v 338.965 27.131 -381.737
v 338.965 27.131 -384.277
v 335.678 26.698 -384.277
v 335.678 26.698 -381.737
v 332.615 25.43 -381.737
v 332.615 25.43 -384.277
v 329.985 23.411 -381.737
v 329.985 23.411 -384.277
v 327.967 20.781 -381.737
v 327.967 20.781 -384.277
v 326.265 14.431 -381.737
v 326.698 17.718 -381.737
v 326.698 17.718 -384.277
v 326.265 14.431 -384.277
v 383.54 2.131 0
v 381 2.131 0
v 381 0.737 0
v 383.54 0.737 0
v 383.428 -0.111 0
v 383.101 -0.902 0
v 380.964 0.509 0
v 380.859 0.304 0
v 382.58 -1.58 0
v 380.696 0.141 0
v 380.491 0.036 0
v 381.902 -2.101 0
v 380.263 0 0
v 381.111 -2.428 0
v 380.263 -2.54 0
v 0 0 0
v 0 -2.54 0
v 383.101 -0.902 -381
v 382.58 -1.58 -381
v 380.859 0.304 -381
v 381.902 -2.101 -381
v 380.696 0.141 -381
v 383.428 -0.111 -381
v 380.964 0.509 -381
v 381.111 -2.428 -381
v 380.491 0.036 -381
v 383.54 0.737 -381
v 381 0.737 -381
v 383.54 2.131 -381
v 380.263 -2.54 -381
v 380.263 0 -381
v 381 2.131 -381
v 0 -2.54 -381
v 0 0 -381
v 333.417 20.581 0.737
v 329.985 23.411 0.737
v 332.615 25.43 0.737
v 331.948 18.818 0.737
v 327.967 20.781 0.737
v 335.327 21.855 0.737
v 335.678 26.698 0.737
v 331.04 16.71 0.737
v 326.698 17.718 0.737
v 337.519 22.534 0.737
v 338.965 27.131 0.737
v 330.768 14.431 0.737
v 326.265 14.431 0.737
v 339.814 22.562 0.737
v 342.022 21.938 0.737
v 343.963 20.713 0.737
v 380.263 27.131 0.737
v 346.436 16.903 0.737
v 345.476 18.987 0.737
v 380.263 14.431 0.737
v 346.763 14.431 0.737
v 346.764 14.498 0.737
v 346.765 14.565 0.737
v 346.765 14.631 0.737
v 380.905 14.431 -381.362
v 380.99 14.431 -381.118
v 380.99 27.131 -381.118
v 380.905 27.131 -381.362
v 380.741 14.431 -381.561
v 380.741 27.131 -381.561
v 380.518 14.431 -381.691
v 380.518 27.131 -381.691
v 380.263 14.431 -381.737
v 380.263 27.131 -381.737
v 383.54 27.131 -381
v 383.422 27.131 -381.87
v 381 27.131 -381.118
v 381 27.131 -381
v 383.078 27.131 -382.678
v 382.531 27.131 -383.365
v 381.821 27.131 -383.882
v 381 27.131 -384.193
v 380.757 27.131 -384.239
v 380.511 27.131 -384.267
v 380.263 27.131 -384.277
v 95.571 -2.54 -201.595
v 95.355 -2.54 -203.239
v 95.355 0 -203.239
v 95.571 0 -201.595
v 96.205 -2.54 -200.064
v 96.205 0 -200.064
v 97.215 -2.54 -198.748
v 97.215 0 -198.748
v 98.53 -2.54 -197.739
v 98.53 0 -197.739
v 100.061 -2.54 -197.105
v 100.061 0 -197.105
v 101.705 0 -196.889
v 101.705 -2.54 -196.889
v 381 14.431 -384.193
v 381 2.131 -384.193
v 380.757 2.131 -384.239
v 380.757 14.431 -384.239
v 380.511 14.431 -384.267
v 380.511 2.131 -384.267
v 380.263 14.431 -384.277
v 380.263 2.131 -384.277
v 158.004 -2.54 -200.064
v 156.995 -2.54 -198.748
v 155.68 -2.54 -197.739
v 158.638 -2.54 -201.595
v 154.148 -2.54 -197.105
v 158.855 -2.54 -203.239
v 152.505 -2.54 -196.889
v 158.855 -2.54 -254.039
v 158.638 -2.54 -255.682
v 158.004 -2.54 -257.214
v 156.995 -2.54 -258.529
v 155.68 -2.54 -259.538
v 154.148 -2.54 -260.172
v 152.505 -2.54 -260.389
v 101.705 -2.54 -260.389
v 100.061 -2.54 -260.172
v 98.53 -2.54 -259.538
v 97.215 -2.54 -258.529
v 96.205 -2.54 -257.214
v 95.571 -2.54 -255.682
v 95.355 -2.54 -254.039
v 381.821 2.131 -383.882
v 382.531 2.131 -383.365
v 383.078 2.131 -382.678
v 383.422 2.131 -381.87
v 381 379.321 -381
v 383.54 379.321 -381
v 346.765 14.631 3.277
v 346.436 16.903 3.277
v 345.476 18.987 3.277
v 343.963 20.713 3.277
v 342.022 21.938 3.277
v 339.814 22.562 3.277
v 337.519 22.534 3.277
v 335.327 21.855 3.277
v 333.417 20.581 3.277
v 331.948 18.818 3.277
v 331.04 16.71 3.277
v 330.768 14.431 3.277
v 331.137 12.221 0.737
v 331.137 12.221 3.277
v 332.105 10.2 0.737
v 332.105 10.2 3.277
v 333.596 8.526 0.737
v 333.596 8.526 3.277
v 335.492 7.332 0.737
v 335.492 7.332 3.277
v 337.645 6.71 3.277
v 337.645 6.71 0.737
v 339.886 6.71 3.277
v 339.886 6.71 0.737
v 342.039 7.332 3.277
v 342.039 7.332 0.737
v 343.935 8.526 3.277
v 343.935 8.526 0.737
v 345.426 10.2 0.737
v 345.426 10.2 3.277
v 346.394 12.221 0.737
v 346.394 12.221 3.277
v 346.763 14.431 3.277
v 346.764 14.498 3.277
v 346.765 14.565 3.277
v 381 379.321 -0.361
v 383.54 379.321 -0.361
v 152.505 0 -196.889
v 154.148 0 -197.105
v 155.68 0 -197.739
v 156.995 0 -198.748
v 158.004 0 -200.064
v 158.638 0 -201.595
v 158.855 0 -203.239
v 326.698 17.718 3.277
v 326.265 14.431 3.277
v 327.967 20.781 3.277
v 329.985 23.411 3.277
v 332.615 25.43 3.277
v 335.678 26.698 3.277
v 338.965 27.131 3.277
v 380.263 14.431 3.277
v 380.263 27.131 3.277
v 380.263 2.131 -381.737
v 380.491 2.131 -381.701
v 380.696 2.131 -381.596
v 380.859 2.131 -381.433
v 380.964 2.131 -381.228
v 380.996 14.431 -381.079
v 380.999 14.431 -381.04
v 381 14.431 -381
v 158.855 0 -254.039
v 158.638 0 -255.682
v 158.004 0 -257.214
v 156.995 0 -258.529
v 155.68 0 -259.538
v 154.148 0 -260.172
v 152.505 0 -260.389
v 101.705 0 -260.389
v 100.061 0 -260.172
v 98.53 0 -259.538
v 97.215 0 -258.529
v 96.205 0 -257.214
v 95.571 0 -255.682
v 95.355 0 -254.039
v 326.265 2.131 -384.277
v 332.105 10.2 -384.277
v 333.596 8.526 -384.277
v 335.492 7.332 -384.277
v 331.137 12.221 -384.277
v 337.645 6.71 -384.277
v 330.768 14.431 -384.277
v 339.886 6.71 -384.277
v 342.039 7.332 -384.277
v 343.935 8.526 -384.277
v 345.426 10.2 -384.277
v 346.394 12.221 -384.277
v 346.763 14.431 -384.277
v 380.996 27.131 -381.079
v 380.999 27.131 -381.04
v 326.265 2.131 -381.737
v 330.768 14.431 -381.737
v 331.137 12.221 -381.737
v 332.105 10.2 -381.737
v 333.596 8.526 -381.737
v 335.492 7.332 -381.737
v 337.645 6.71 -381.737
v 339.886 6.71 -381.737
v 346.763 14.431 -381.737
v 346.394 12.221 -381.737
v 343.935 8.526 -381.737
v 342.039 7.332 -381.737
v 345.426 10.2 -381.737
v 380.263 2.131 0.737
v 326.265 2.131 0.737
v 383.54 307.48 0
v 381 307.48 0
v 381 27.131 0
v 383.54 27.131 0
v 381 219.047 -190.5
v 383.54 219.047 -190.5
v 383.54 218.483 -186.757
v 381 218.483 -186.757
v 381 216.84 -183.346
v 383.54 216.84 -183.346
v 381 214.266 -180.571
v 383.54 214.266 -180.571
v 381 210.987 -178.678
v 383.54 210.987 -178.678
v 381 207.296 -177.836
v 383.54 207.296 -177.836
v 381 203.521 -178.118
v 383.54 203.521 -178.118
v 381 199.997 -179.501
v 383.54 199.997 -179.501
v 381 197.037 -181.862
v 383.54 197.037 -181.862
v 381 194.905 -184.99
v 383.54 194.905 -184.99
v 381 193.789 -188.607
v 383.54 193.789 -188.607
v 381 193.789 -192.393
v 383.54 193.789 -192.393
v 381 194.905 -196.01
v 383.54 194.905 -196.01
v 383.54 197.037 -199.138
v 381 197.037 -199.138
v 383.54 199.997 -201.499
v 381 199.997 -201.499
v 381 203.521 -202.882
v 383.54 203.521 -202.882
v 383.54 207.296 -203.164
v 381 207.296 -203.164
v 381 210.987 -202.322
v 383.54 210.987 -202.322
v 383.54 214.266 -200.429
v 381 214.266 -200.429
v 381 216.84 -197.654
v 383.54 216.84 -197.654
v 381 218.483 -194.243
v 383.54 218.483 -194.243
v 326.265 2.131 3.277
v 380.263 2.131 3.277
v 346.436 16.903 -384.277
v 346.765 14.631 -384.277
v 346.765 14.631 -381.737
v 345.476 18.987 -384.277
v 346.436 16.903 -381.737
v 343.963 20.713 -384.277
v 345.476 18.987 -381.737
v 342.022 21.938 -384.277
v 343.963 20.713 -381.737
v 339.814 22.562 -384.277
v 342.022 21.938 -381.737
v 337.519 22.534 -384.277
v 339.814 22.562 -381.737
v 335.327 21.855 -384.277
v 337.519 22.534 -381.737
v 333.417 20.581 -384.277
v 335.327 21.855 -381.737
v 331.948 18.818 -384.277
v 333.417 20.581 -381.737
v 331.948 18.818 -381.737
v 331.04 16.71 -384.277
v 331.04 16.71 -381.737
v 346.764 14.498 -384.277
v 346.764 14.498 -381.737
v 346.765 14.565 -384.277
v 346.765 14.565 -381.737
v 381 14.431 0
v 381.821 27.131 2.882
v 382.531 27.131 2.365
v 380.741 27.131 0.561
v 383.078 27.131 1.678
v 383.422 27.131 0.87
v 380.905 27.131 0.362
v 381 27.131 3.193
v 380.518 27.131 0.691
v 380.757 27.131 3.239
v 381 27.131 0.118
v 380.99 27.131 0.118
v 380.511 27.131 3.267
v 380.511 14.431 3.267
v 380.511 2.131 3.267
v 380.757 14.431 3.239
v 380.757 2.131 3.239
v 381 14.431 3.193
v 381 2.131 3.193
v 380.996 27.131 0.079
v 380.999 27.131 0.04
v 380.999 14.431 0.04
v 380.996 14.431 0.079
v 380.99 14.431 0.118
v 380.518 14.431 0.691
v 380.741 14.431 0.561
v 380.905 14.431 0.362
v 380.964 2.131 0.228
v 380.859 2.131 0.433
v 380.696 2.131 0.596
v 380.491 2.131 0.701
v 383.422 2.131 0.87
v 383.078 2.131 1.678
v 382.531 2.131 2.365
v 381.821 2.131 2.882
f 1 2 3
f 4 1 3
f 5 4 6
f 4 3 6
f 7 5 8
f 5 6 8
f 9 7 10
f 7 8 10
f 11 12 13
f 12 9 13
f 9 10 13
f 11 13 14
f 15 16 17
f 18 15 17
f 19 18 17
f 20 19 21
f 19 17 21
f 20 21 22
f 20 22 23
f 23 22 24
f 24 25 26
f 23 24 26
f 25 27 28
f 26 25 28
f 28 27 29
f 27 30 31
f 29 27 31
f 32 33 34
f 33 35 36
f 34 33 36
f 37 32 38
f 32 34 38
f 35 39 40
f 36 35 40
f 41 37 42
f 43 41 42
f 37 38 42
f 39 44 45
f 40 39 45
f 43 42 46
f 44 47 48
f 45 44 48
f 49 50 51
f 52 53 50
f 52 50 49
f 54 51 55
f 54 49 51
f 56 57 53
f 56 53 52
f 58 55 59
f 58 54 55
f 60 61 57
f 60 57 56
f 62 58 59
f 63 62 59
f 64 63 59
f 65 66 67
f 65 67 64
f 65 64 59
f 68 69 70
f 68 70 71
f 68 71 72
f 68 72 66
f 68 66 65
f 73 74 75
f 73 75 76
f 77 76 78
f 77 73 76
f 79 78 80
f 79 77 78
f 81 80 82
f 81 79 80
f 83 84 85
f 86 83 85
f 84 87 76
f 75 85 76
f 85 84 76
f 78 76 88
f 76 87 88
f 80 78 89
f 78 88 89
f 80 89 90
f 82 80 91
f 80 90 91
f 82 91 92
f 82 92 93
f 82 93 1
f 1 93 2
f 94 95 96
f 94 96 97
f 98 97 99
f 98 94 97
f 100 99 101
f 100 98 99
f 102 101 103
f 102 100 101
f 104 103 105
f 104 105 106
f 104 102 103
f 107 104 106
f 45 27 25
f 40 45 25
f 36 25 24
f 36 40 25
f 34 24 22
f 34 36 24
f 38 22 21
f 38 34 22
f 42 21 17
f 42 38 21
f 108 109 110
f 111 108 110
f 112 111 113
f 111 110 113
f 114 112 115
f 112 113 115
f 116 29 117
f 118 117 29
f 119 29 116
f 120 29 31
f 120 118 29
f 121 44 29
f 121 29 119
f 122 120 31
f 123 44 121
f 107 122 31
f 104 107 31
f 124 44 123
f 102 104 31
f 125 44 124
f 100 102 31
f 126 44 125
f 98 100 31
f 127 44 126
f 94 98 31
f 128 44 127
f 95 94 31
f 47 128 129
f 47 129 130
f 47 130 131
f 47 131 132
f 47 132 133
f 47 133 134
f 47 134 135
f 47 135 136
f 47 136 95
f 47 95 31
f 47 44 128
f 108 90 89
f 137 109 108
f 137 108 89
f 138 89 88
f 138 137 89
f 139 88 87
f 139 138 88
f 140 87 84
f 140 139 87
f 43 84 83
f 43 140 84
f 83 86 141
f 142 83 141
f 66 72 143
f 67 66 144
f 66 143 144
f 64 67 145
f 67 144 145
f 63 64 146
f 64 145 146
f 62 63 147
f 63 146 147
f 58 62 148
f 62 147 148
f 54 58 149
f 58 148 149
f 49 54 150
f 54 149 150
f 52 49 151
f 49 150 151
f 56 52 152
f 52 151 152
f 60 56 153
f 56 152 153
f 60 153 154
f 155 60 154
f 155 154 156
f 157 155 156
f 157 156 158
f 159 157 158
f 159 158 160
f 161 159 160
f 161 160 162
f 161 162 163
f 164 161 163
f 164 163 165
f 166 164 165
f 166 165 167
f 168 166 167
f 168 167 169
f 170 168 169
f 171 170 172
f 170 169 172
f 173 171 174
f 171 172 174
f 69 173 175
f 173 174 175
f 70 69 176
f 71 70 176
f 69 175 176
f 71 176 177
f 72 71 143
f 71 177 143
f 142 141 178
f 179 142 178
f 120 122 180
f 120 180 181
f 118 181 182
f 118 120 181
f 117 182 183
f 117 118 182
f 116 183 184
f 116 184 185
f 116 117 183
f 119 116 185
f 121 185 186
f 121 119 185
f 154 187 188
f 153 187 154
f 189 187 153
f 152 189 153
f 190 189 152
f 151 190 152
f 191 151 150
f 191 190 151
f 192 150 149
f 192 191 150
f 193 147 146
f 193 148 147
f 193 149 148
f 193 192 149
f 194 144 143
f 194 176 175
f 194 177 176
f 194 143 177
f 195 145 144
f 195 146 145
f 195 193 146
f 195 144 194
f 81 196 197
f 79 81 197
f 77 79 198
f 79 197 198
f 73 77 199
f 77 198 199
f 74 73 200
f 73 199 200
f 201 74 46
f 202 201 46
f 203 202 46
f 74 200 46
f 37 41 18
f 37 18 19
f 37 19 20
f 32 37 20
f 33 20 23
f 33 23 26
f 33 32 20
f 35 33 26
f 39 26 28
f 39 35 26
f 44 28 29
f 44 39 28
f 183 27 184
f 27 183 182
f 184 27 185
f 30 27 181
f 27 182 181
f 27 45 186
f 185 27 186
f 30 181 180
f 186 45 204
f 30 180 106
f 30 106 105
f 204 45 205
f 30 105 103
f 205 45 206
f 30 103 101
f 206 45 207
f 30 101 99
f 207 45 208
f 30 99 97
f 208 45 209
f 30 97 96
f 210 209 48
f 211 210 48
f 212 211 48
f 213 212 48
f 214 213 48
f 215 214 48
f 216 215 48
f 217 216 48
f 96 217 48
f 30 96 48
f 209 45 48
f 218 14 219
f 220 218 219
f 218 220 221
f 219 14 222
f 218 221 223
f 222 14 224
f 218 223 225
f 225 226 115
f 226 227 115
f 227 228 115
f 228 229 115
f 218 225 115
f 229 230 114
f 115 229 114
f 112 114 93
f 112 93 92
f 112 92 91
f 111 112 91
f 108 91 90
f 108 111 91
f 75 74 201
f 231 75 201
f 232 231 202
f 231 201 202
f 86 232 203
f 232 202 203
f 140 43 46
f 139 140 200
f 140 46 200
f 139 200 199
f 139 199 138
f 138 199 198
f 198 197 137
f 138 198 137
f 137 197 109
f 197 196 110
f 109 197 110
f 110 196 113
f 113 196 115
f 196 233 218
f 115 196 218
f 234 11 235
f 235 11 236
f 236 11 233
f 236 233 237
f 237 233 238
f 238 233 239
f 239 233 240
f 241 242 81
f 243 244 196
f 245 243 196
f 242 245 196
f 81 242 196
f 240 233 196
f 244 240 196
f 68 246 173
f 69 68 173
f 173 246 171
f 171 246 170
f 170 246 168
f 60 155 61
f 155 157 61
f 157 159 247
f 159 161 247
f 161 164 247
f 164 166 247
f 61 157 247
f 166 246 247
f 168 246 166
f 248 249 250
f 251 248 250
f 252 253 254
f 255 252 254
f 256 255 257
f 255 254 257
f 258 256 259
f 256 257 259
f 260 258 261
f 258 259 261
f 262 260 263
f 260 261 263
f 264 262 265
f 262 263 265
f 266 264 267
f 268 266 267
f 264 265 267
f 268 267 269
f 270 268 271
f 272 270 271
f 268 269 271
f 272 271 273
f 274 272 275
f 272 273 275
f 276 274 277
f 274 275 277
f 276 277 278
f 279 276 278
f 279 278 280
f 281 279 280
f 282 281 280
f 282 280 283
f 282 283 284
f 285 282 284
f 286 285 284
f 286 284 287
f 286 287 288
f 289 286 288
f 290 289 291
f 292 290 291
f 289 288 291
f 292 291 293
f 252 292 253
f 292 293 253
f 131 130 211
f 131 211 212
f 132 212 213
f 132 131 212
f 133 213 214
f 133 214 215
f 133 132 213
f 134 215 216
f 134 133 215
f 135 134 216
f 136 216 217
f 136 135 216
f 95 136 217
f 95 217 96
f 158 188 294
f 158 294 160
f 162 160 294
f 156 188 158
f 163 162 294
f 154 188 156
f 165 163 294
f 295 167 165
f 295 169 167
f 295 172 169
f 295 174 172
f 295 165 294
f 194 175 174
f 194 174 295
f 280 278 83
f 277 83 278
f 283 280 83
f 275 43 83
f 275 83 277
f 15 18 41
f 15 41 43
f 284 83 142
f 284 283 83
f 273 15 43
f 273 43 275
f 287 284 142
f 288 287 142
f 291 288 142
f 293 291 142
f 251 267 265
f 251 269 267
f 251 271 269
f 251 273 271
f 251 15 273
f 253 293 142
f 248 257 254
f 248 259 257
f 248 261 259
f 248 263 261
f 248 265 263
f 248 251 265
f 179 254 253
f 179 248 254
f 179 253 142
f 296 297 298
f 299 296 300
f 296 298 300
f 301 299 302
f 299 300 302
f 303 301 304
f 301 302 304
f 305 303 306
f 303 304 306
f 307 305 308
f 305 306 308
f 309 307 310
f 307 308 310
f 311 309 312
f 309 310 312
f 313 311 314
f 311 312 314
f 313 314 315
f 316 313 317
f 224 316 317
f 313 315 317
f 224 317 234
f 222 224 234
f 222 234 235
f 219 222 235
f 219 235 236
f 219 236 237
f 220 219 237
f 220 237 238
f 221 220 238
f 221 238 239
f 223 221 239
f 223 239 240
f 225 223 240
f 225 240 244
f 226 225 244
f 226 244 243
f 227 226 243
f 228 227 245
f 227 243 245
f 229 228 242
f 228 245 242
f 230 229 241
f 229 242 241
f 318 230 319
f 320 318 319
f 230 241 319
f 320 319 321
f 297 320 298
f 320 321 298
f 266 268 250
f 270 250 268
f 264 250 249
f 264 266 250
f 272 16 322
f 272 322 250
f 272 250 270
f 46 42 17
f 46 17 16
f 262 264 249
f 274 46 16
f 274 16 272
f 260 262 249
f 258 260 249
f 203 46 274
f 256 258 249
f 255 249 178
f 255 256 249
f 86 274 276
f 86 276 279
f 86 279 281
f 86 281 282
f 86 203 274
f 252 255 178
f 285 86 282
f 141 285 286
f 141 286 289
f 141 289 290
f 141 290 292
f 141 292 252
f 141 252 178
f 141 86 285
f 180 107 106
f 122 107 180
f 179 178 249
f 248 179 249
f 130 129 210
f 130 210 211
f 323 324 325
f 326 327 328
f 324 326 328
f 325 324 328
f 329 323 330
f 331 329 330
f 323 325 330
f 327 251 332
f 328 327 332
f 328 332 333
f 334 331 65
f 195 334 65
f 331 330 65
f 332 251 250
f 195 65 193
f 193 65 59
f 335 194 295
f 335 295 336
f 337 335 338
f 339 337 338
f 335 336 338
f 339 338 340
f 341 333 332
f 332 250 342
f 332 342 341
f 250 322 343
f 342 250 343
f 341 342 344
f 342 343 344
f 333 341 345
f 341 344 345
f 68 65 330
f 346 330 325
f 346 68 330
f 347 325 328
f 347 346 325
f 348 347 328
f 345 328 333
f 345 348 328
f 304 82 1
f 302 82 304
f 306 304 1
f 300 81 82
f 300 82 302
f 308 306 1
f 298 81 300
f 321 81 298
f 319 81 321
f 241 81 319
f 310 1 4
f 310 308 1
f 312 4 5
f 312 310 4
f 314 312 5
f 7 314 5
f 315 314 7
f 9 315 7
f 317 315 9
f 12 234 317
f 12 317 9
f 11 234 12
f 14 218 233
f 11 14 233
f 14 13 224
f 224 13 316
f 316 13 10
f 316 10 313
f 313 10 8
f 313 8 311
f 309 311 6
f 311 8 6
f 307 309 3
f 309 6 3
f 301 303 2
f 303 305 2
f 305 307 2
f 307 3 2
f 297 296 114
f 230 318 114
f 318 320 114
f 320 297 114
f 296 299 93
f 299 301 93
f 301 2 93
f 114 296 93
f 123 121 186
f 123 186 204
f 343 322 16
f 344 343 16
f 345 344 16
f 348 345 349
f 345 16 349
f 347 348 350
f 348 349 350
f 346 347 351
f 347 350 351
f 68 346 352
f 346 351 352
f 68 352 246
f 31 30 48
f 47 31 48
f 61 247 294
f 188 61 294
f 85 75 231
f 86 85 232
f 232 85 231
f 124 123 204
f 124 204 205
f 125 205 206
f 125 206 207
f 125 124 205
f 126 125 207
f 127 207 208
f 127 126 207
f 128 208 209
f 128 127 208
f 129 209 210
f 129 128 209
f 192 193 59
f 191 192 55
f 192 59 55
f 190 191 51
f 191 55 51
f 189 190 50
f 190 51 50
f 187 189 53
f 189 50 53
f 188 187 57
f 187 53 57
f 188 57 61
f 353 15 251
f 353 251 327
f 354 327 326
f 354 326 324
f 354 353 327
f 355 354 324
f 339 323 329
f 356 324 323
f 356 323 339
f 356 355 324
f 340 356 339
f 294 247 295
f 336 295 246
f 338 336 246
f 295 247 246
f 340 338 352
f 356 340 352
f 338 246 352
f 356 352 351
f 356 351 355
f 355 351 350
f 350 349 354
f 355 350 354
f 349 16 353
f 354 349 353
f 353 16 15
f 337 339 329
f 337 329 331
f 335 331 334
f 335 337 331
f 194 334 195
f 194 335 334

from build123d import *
from build123d.topology import SkipClean

# Parameters (mm, degrees)
BASE_FLANGE1_DEPTH       = 2.54
SKETCHED_START           = 383.54
SKETCHED_BEND2_OUTLINE_W = 2.54
SKETCHED_BEND2_OUTLINE_H = 495.3
SKETCHED_BEND2_DEPTH     = 378.46
SKETCHED_START_2         = 381
SKETCHED_BEND2_2_DEPTH   = 2.221317884
SKETCHED_START_3         = 380.2634
SKETCHED_BEND2_3_DEPTH   = 3.2766
SKETCHED_START_4         = -438.15
SKETCHED_BEND2_4_DEPTH   = 495.3
SKETCHED_START_5         = 2.131240091
SKETCHED_BEND7_DEPTH     = 25
SKETCHED_BEND7_2_DEPTH   = 12.3
SKETCHED_START_6         = -384.2766
SKETCHED_BEND7_3_DEPTH   = 3.158240169
SKETCHED_START_7         = 0.118359831
SKETCHED_BEND7_4_DEPTH   = 3.158240169
SKETCHED_START_8         = 14.431240091
SKETCHED_BEND7_5_DEPTH   = 12.7
SKETCHED_BEND7_6_DEPTH   = 12.7
SKETCH20_R               = 8
CUT_EXTRUDE1_DEPTH       = 665.217598099
SKETCH21_R               = 12.7
CUT_EXTRUDE2_DEPTH       = 2.54
CUT_EXTRUDE3_DEPTH       = 2.54


with BuildPart() as part:
    # Base-Flange1: sheet metal written as solids
    # Sketch1 → Base-Flange1 (new body)
    with BuildSketch(Plane(origin=(0, 0, 0), x_dir=(1, 0, 0), z_dir=(0, 1, 0))):
        with BuildLine():
            Line((0, 0), (0, 381))
            Line((0, 381), (384.81, 381))
            Line((384.81, 381), (384.81, 438.15))
            Line((384.81, 438.15), (397.11, 438.15))
            ThreePointArc((397.11, 438.15), (406.090256121, 434.430256121), (409.81, 425.45))
            Line((409.81, 425.45), (409.81, 381))
            Line((409.81, 381), (690.157951031, 381))
            Line((690.157951031, 381), (762, 381))
            Line((762, 381), (762, 0.361010763))
            Line((762, 0.361010763), (690.158858088, 0))
            Line((690.158858088, 0), (409.81, 0))
            Line((409.81, 0), (409.81, -44.45))
            ThreePointArc((409.81, -44.45), (406.090256121, -53.430256121), (397.11, -57.15))
            Line((397.11, -57.15), (384.81, -57.15))
            Line((384.81, -57.15), (384.81, 0))
            Line((384.81, 0), (0, 0))
        make_face()
    extrude(amount=-BASE_FLANGE1_DEPTH)

    # Sketched Bend2: read off the stored shape, not the designer's step
    # Sketched Bend2 outline → Sketched Bend2 (cut)
    with BuildSketch(Plane.YZ.offset(SKETCHED_START)):
        with Locations((-1.27, -190.5)):
            Rectangle(SKETCHED_BEND2_OUTLINE_W, SKETCHED_BEND2_OUTLINE_H)
    extrude(amount=SKETCHED_BEND2_DEPTH, mode=Mode.SUBTRACT)

    # Sketched Bend2 2 outline → Sketched Bend2 2 (add)
    with BuildSketch(Plane.YZ.offset(SKETCHED_START_2)):
        with BuildLine():
            Line((2.131240091, 57.15), (2.131240091, 0))
            Line((2.131240091, 0), (0, 0))
            Line((0, 0), (0, -381))
            Line((0, -381), (2.131240091, -381))
            Line((2.131240091, -381), (2.131240091, -438.15))
            Line((2.131240091, -438.15), (14.431240091, -438.15))
            ThreePointArc((14.431240091, -438.15), (23.411496212, -434.430256121), (27.131240091, -425.45))
            Line((27.131240091, -425.45), (27.131240091, -381))
            Line((27.131240091, -381), (379.321240091, -381))
            Line((379.321240091, -381), (379.321240091, -0.361010763))
            Line((379.321240091, -0.361010763), (307.480098179, 0))
            Line((307.480098179, 0), (27.131240091, 0))
            Line((27.131240091, 0), (27.131240091, 44.45))
            ThreePointArc((27.131240091, 44.45), (23.411496212, 53.430256121), (14.431240091, 57.15))
            Line((14.431240091, 57.15), (2.131240091, 57.15))
        make_face()
    extrude(amount=SKETCHED_BEND2_2_DEPTH)

    # Sketched Bend2 3 outline → Sketched Bend2 3 (add)
    with BuildSketch(Plane.YZ.offset(SKETCHED_START_3)):
        with BuildLine():
            Line((2.131240091, 57.15), (2.131240091, 0))
            Line((2.131240091, 0), (0, 0))
            Line((0, 0), (0, -381))
            Line((0, -381), (2.131240091, -381))
            Line((2.131240091, -381), (2.131240091, -438.15))
            Line((2.131240091, -438.15), (14.431240091, -438.15))
            ThreePointArc((14.431240091, -438.15), (23.411496212, -434.430256121), (27.131240091, -425.45))
            Line((27.131240091, -425.45), (27.131240091, -381))
            Line((27.131240091, -381), (379.321240091, -381))
            Line((379.321240091, -381), (379.321240091, -0.361010763))
            Line((379.321240091, -0.361010763), (307.480098179, 0))
            Line((307.480098179, 0), (27.131240091, 0))
            Line((27.131240091, 0), (27.131240091, 44.45))
            ThreePointArc((27.131240091, 44.45), (23.411496212, 53.430256121), (14.431240091, 57.15))
            Line((14.431240091, 57.15), (2.131240091, 57.15))
        make_face()
    extrude(amount=SKETCHED_BEND2_3_DEPTH)

    # Sketched Bend2 4 outline → Sketched Bend2 4 (cut)
    with BuildSketch(Plane.XY.offset(SKETCHED_START_4)):
        with BuildLine():
            ThreePointArc((380.2634, 0), (380.784254855, 0.215745145), (381, 0.7366))
            Line((381, 0.7366), (381, 379.321240091))
            Line((381, 379.321240091), (380.2634, 379.321240091))
            Line((380.2634, 379.321240091), (380.2634, 0))
        make_face()
        with BuildLine():
            Line((383.54, -2.54), (383.54, 0.7366))
            ThreePointArc((383.54, 0.7366), (382.580306079, -1.580306079), (380.2634, -2.54))
            Line((380.2634, -2.54), (383.54, -2.54))
        make_face()
    extrude(amount=SKETCHED_BEND2_4_DEPTH, mode=Mode.SUBTRACT)

    # Sketched Bend7: read off the stored shape, not the designer's step
    # Sketched Bend7 outline → Sketched Bend7 (cut)
    with BuildSketch(Plane(origin=(0, 0, 0), x_dir=(1, 0, 0), z_dir=(0, 1, 0)).offset(SKETCHED_START_5)):
        with BuildLine():
            Line((383.54, -57.15), (383.54, 0))
            ThreePointArc((383.54, 0), (382.827542266, -2.039922057), (381, -3.192730493))
            Line((381, -3.192730493), (381, -57.15))
            Line((381, -57.15), (383.54, -57.15))
        make_face()
        with BuildLine():
            ThreePointArc((381, 384.192730493), (382.827542266, 383.039922057), (383.54, 381))
            Line((383.54, 381), (383.54, 438.15))
            Line((383.54, 438.15), (381, 438.15))
            Line((381, 438.15), (381, 384.192730493))
        make_face()
    extrude(amount=SKETCHED_BEND7_DEPTH, mode=Mode.SUBTRACT)

    # Sketched Bend7 2 outline → Sketched Bend7 2 (add)
    with BuildSketch(Plane(origin=(0, 0, 0), x_dir=(1, 0, 0), z_dir=(0, 1, 0)).offset(SKETCHED_START_5)):
        with BuildLine():
            ThreePointArc((380.2634, -3.2766), (380.634079664, -3.255565104), (381, -3.192730493))
            Line((381, -3.192730493), (381, 0))
            ThreePointArc((381, 0), (380.784254855, -0.520854855), (380.2634, -0.7366))
            Line((380.2634, -0.7366), (326.265359909, -0.7366))
            Line((326.265359909, -0.7366), (326.265359909, -3.2766))
            Line((326.265359909, -3.2766), (380.2634, -3.2766))
        make_face()
        with BuildLine():
            Line((381, 381), (381, 384.192730493))
            ThreePointArc((381, 384.192730493), (380.634079664, 384.255565104), (380.2634, 384.2766))
            Line((380.2634, 384.2766), (326.265359909, 384.2766))
            Line((326.265359909, 384.2766), (326.265359909, 381.7366))
            Line((326.265359909, 381.7366), (380.2634, 381.7366))
            ThreePointArc((380.2634, 381.7366), (380.784254855, 381.520854855), (381, 381))
        make_face()
    extrude(amount=SKETCHED_BEND7_2_DEPTH)

    # Sketched Bend7 3 outline → Sketched Bend7 3 (add)
    with BuildSketch(Plane.XY.offset(SKETCHED_START_6)):
        with BuildLine():
            Line((381, 14.431240091), (381, 27.131240091))
            Line((381, 27.131240091), (338.965359909, 27.131240091))
            ThreePointArc((338.965359909, 27.131240091), (329.985103788, 23.411496212), (326.265359909, 14.431240091))
            Line((326.265359909, 14.431240091), (381, 14.431240091))
        make_face()
    extrude(amount=SKETCHED_BEND7_3_DEPTH)

    # Sketched Bend7 4 outline → Sketched Bend7 4 (add)
    with BuildSketch(Plane.XY.offset(SKETCHED_START_7)):
        with BuildLine():
            Line((381, 14.431240091), (381, 27.131240091))
            Line((381, 27.131240091), (338.965359909, 27.131240091))
            ThreePointArc((338.965359909, 27.131240091), (329.985103788, 23.411496212), (326.265359909, 14.431240091))
            Line((326.265359909, 14.431240091), (381, 14.431240091))
        make_face()
    extrude(amount=SKETCHED_BEND7_4_DEPTH)

    # Sketched Bend7 5 outline → Sketched Bend7 5 (cut)
    with SkipClean():  # the faces are left unmerged after this step: merging them gives an invalid solid
        with BuildSketch(Plane(origin=(0, 0, 0), x_dir=(1, 0, 0), z_dir=(0, 1, 0)).offset(SKETCHED_START_8)):
            with BuildLine():
                Line((381, -3.2766), (381, -3.192730493))
                ThreePointArc((381, -3.192730493), (380.634079664, -3.255565104), (380.2634, -3.2766))
                Line((380.2634, -3.2766), (325, -3.276600014))
                Line((325, -3.276600014), (325, -5))
                Line((325, -5), (381.000000013, -5))
                Line((381.000000013, -5), (381, -3.2766))
            make_face()
            with BuildLine():
                ThreePointArc((380.2634, -0.7366), (380.740576963, -0.561143213), (380.990428549, -0.118359831))
                Line((380.990428549, -0.118359831), (325, -0.118359831))
                Line((325, -0.118359831), (325, -0.7366))
                Line((325, -0.7366), (380.2634, -0.7366))
            make_face()
            with BuildLine():
                Line((325, 381.118359831), (380.990428549, 381.118359831))
                ThreePointArc((380.990428549, 381.118359831), (380.740576963, 381.561143213), (380.2634, 381.7366))
                Line((380.2634, 381.7366), (325, 381.7366))
                Line((325, 381.7366), (325, 381.118359831))
            make_face()
            with BuildLine():
                ThreePointArc((380.2634, 384.2766), (380.634079664, 384.255565104), (381, 384.192730493))
                Line((381, 384.192730493), (381, 384.2766))
                Line((381, 384.2766), (381.000000039, 386))
                Line((381.000000039, 386), (325, 386))
                Line((325, 386), (325, 384.276600014))
                Line((325, 384.276600014), (380.2634, 384.2766))
            make_face()
        extrude(amount=SKETCHED_BEND7_5_DEPTH, mode=Mode.SUBTRACT)

    # Sketched Bend7 6 outline → Sketched Bend7 6 (add)
    with SkipClean():  # the faces are left unmerged after this step: merging them gives an invalid solid
        with BuildSketch(Plane(origin=(0, 0, 0), x_dir=(1, 0, 0), z_dir=(0, 1, 0)).offset(SKETCHED_START_8)):
            with BuildLine():
                Line((380.990428549, -0.118359831), (381, -0.118359831))
                Line((381, -0.118359831), (381, 0))
                ThreePointArc((381, 0), (380.997603238, -0.059373105), (380.990428549, -0.118359831))
            make_face()
            with BuildLine():
                ThreePointArc((380.990428549, 381.118359831), (380.997603238, 381.059373105), (381, 381))
                Line((381, 381), (381.000000039, 381.118359831))
                Line((381.000000039, 381.118359831), (380.990428549, 381.118359831))
            make_face()
        extrude(amount=SKETCHED_BEND7_6_DEPTH)

    # Sketch20 → Cut-Extrude1 (cut, through all)
    with SkipClean():  # the faces are left unmerged after this step: merging them gives an invalid solid
        with BuildSketch(Plane.XY.offset(3.2766)):
            with Locations((338.765359909, 14.631240091)):
                Circle(SKETCH20_R)
        extrude(amount=-CUT_EXTRUDE1_DEPTH, mode=Mode.SUBTRACT)

    # Sketch21 → Cut-Extrude2 (cut)
    with SkipClean():  # the faces are left unmerged after this step: merging them gives an invalid solid
        with BuildSketch(Plane(origin=(383.54, 0, 0), x_dir=(0, 0, -1), z_dir=(1, 0, 0))):
            with Locations(Location((190.5, 206.347240091, 0), (0, 0, 90))):
                Circle(SKETCH21_R)
        extrude(amount=-CUT_EXTRUDE2_DEPTH, mode=Mode.SUBTRACT)

    # Sketch22 → Cut-Extrude3 (cut)
    with SkipClean():  # the faces are left unmerged after this step: merging them gives an invalid solid
        with BuildSketch(Plane.XZ.offset(2.54)):
            with BuildLine():
                Line((101.704654894, -196.888541513), (152.504654894, -196.888541513))
                ThreePointArc((152.504654894, -196.888541513), (156.994782955, -198.748413452), (158.854654894, -203.238541513))
                Line((158.854654894, -203.238541513), (158.854654894, -254.038541513))
                ThreePointArc((158.854654894, -254.038541513), (156.994782955, -258.528669573), (152.504654894, -260.388541513))
                Line((152.504654894, -260.388541513), (101.704654894, -260.388541513))
                ThreePointArc((101.704654894, -260.388541513), (97.214526834, -258.528669573), (95.354654894, -254.038541513))
                Line((95.354654894, -254.038541513), (95.354654894, -203.238541513))
                ThreePointArc((95.354654894, -203.238541513), (97.214526834, -198.748413452), (101.704654894, -196.888541513))
            make_face()
        extrude(amount=-CUT_EXTRUDE3_DEPTH, mode=Mode.SUBTRACT)


solid = part.part
